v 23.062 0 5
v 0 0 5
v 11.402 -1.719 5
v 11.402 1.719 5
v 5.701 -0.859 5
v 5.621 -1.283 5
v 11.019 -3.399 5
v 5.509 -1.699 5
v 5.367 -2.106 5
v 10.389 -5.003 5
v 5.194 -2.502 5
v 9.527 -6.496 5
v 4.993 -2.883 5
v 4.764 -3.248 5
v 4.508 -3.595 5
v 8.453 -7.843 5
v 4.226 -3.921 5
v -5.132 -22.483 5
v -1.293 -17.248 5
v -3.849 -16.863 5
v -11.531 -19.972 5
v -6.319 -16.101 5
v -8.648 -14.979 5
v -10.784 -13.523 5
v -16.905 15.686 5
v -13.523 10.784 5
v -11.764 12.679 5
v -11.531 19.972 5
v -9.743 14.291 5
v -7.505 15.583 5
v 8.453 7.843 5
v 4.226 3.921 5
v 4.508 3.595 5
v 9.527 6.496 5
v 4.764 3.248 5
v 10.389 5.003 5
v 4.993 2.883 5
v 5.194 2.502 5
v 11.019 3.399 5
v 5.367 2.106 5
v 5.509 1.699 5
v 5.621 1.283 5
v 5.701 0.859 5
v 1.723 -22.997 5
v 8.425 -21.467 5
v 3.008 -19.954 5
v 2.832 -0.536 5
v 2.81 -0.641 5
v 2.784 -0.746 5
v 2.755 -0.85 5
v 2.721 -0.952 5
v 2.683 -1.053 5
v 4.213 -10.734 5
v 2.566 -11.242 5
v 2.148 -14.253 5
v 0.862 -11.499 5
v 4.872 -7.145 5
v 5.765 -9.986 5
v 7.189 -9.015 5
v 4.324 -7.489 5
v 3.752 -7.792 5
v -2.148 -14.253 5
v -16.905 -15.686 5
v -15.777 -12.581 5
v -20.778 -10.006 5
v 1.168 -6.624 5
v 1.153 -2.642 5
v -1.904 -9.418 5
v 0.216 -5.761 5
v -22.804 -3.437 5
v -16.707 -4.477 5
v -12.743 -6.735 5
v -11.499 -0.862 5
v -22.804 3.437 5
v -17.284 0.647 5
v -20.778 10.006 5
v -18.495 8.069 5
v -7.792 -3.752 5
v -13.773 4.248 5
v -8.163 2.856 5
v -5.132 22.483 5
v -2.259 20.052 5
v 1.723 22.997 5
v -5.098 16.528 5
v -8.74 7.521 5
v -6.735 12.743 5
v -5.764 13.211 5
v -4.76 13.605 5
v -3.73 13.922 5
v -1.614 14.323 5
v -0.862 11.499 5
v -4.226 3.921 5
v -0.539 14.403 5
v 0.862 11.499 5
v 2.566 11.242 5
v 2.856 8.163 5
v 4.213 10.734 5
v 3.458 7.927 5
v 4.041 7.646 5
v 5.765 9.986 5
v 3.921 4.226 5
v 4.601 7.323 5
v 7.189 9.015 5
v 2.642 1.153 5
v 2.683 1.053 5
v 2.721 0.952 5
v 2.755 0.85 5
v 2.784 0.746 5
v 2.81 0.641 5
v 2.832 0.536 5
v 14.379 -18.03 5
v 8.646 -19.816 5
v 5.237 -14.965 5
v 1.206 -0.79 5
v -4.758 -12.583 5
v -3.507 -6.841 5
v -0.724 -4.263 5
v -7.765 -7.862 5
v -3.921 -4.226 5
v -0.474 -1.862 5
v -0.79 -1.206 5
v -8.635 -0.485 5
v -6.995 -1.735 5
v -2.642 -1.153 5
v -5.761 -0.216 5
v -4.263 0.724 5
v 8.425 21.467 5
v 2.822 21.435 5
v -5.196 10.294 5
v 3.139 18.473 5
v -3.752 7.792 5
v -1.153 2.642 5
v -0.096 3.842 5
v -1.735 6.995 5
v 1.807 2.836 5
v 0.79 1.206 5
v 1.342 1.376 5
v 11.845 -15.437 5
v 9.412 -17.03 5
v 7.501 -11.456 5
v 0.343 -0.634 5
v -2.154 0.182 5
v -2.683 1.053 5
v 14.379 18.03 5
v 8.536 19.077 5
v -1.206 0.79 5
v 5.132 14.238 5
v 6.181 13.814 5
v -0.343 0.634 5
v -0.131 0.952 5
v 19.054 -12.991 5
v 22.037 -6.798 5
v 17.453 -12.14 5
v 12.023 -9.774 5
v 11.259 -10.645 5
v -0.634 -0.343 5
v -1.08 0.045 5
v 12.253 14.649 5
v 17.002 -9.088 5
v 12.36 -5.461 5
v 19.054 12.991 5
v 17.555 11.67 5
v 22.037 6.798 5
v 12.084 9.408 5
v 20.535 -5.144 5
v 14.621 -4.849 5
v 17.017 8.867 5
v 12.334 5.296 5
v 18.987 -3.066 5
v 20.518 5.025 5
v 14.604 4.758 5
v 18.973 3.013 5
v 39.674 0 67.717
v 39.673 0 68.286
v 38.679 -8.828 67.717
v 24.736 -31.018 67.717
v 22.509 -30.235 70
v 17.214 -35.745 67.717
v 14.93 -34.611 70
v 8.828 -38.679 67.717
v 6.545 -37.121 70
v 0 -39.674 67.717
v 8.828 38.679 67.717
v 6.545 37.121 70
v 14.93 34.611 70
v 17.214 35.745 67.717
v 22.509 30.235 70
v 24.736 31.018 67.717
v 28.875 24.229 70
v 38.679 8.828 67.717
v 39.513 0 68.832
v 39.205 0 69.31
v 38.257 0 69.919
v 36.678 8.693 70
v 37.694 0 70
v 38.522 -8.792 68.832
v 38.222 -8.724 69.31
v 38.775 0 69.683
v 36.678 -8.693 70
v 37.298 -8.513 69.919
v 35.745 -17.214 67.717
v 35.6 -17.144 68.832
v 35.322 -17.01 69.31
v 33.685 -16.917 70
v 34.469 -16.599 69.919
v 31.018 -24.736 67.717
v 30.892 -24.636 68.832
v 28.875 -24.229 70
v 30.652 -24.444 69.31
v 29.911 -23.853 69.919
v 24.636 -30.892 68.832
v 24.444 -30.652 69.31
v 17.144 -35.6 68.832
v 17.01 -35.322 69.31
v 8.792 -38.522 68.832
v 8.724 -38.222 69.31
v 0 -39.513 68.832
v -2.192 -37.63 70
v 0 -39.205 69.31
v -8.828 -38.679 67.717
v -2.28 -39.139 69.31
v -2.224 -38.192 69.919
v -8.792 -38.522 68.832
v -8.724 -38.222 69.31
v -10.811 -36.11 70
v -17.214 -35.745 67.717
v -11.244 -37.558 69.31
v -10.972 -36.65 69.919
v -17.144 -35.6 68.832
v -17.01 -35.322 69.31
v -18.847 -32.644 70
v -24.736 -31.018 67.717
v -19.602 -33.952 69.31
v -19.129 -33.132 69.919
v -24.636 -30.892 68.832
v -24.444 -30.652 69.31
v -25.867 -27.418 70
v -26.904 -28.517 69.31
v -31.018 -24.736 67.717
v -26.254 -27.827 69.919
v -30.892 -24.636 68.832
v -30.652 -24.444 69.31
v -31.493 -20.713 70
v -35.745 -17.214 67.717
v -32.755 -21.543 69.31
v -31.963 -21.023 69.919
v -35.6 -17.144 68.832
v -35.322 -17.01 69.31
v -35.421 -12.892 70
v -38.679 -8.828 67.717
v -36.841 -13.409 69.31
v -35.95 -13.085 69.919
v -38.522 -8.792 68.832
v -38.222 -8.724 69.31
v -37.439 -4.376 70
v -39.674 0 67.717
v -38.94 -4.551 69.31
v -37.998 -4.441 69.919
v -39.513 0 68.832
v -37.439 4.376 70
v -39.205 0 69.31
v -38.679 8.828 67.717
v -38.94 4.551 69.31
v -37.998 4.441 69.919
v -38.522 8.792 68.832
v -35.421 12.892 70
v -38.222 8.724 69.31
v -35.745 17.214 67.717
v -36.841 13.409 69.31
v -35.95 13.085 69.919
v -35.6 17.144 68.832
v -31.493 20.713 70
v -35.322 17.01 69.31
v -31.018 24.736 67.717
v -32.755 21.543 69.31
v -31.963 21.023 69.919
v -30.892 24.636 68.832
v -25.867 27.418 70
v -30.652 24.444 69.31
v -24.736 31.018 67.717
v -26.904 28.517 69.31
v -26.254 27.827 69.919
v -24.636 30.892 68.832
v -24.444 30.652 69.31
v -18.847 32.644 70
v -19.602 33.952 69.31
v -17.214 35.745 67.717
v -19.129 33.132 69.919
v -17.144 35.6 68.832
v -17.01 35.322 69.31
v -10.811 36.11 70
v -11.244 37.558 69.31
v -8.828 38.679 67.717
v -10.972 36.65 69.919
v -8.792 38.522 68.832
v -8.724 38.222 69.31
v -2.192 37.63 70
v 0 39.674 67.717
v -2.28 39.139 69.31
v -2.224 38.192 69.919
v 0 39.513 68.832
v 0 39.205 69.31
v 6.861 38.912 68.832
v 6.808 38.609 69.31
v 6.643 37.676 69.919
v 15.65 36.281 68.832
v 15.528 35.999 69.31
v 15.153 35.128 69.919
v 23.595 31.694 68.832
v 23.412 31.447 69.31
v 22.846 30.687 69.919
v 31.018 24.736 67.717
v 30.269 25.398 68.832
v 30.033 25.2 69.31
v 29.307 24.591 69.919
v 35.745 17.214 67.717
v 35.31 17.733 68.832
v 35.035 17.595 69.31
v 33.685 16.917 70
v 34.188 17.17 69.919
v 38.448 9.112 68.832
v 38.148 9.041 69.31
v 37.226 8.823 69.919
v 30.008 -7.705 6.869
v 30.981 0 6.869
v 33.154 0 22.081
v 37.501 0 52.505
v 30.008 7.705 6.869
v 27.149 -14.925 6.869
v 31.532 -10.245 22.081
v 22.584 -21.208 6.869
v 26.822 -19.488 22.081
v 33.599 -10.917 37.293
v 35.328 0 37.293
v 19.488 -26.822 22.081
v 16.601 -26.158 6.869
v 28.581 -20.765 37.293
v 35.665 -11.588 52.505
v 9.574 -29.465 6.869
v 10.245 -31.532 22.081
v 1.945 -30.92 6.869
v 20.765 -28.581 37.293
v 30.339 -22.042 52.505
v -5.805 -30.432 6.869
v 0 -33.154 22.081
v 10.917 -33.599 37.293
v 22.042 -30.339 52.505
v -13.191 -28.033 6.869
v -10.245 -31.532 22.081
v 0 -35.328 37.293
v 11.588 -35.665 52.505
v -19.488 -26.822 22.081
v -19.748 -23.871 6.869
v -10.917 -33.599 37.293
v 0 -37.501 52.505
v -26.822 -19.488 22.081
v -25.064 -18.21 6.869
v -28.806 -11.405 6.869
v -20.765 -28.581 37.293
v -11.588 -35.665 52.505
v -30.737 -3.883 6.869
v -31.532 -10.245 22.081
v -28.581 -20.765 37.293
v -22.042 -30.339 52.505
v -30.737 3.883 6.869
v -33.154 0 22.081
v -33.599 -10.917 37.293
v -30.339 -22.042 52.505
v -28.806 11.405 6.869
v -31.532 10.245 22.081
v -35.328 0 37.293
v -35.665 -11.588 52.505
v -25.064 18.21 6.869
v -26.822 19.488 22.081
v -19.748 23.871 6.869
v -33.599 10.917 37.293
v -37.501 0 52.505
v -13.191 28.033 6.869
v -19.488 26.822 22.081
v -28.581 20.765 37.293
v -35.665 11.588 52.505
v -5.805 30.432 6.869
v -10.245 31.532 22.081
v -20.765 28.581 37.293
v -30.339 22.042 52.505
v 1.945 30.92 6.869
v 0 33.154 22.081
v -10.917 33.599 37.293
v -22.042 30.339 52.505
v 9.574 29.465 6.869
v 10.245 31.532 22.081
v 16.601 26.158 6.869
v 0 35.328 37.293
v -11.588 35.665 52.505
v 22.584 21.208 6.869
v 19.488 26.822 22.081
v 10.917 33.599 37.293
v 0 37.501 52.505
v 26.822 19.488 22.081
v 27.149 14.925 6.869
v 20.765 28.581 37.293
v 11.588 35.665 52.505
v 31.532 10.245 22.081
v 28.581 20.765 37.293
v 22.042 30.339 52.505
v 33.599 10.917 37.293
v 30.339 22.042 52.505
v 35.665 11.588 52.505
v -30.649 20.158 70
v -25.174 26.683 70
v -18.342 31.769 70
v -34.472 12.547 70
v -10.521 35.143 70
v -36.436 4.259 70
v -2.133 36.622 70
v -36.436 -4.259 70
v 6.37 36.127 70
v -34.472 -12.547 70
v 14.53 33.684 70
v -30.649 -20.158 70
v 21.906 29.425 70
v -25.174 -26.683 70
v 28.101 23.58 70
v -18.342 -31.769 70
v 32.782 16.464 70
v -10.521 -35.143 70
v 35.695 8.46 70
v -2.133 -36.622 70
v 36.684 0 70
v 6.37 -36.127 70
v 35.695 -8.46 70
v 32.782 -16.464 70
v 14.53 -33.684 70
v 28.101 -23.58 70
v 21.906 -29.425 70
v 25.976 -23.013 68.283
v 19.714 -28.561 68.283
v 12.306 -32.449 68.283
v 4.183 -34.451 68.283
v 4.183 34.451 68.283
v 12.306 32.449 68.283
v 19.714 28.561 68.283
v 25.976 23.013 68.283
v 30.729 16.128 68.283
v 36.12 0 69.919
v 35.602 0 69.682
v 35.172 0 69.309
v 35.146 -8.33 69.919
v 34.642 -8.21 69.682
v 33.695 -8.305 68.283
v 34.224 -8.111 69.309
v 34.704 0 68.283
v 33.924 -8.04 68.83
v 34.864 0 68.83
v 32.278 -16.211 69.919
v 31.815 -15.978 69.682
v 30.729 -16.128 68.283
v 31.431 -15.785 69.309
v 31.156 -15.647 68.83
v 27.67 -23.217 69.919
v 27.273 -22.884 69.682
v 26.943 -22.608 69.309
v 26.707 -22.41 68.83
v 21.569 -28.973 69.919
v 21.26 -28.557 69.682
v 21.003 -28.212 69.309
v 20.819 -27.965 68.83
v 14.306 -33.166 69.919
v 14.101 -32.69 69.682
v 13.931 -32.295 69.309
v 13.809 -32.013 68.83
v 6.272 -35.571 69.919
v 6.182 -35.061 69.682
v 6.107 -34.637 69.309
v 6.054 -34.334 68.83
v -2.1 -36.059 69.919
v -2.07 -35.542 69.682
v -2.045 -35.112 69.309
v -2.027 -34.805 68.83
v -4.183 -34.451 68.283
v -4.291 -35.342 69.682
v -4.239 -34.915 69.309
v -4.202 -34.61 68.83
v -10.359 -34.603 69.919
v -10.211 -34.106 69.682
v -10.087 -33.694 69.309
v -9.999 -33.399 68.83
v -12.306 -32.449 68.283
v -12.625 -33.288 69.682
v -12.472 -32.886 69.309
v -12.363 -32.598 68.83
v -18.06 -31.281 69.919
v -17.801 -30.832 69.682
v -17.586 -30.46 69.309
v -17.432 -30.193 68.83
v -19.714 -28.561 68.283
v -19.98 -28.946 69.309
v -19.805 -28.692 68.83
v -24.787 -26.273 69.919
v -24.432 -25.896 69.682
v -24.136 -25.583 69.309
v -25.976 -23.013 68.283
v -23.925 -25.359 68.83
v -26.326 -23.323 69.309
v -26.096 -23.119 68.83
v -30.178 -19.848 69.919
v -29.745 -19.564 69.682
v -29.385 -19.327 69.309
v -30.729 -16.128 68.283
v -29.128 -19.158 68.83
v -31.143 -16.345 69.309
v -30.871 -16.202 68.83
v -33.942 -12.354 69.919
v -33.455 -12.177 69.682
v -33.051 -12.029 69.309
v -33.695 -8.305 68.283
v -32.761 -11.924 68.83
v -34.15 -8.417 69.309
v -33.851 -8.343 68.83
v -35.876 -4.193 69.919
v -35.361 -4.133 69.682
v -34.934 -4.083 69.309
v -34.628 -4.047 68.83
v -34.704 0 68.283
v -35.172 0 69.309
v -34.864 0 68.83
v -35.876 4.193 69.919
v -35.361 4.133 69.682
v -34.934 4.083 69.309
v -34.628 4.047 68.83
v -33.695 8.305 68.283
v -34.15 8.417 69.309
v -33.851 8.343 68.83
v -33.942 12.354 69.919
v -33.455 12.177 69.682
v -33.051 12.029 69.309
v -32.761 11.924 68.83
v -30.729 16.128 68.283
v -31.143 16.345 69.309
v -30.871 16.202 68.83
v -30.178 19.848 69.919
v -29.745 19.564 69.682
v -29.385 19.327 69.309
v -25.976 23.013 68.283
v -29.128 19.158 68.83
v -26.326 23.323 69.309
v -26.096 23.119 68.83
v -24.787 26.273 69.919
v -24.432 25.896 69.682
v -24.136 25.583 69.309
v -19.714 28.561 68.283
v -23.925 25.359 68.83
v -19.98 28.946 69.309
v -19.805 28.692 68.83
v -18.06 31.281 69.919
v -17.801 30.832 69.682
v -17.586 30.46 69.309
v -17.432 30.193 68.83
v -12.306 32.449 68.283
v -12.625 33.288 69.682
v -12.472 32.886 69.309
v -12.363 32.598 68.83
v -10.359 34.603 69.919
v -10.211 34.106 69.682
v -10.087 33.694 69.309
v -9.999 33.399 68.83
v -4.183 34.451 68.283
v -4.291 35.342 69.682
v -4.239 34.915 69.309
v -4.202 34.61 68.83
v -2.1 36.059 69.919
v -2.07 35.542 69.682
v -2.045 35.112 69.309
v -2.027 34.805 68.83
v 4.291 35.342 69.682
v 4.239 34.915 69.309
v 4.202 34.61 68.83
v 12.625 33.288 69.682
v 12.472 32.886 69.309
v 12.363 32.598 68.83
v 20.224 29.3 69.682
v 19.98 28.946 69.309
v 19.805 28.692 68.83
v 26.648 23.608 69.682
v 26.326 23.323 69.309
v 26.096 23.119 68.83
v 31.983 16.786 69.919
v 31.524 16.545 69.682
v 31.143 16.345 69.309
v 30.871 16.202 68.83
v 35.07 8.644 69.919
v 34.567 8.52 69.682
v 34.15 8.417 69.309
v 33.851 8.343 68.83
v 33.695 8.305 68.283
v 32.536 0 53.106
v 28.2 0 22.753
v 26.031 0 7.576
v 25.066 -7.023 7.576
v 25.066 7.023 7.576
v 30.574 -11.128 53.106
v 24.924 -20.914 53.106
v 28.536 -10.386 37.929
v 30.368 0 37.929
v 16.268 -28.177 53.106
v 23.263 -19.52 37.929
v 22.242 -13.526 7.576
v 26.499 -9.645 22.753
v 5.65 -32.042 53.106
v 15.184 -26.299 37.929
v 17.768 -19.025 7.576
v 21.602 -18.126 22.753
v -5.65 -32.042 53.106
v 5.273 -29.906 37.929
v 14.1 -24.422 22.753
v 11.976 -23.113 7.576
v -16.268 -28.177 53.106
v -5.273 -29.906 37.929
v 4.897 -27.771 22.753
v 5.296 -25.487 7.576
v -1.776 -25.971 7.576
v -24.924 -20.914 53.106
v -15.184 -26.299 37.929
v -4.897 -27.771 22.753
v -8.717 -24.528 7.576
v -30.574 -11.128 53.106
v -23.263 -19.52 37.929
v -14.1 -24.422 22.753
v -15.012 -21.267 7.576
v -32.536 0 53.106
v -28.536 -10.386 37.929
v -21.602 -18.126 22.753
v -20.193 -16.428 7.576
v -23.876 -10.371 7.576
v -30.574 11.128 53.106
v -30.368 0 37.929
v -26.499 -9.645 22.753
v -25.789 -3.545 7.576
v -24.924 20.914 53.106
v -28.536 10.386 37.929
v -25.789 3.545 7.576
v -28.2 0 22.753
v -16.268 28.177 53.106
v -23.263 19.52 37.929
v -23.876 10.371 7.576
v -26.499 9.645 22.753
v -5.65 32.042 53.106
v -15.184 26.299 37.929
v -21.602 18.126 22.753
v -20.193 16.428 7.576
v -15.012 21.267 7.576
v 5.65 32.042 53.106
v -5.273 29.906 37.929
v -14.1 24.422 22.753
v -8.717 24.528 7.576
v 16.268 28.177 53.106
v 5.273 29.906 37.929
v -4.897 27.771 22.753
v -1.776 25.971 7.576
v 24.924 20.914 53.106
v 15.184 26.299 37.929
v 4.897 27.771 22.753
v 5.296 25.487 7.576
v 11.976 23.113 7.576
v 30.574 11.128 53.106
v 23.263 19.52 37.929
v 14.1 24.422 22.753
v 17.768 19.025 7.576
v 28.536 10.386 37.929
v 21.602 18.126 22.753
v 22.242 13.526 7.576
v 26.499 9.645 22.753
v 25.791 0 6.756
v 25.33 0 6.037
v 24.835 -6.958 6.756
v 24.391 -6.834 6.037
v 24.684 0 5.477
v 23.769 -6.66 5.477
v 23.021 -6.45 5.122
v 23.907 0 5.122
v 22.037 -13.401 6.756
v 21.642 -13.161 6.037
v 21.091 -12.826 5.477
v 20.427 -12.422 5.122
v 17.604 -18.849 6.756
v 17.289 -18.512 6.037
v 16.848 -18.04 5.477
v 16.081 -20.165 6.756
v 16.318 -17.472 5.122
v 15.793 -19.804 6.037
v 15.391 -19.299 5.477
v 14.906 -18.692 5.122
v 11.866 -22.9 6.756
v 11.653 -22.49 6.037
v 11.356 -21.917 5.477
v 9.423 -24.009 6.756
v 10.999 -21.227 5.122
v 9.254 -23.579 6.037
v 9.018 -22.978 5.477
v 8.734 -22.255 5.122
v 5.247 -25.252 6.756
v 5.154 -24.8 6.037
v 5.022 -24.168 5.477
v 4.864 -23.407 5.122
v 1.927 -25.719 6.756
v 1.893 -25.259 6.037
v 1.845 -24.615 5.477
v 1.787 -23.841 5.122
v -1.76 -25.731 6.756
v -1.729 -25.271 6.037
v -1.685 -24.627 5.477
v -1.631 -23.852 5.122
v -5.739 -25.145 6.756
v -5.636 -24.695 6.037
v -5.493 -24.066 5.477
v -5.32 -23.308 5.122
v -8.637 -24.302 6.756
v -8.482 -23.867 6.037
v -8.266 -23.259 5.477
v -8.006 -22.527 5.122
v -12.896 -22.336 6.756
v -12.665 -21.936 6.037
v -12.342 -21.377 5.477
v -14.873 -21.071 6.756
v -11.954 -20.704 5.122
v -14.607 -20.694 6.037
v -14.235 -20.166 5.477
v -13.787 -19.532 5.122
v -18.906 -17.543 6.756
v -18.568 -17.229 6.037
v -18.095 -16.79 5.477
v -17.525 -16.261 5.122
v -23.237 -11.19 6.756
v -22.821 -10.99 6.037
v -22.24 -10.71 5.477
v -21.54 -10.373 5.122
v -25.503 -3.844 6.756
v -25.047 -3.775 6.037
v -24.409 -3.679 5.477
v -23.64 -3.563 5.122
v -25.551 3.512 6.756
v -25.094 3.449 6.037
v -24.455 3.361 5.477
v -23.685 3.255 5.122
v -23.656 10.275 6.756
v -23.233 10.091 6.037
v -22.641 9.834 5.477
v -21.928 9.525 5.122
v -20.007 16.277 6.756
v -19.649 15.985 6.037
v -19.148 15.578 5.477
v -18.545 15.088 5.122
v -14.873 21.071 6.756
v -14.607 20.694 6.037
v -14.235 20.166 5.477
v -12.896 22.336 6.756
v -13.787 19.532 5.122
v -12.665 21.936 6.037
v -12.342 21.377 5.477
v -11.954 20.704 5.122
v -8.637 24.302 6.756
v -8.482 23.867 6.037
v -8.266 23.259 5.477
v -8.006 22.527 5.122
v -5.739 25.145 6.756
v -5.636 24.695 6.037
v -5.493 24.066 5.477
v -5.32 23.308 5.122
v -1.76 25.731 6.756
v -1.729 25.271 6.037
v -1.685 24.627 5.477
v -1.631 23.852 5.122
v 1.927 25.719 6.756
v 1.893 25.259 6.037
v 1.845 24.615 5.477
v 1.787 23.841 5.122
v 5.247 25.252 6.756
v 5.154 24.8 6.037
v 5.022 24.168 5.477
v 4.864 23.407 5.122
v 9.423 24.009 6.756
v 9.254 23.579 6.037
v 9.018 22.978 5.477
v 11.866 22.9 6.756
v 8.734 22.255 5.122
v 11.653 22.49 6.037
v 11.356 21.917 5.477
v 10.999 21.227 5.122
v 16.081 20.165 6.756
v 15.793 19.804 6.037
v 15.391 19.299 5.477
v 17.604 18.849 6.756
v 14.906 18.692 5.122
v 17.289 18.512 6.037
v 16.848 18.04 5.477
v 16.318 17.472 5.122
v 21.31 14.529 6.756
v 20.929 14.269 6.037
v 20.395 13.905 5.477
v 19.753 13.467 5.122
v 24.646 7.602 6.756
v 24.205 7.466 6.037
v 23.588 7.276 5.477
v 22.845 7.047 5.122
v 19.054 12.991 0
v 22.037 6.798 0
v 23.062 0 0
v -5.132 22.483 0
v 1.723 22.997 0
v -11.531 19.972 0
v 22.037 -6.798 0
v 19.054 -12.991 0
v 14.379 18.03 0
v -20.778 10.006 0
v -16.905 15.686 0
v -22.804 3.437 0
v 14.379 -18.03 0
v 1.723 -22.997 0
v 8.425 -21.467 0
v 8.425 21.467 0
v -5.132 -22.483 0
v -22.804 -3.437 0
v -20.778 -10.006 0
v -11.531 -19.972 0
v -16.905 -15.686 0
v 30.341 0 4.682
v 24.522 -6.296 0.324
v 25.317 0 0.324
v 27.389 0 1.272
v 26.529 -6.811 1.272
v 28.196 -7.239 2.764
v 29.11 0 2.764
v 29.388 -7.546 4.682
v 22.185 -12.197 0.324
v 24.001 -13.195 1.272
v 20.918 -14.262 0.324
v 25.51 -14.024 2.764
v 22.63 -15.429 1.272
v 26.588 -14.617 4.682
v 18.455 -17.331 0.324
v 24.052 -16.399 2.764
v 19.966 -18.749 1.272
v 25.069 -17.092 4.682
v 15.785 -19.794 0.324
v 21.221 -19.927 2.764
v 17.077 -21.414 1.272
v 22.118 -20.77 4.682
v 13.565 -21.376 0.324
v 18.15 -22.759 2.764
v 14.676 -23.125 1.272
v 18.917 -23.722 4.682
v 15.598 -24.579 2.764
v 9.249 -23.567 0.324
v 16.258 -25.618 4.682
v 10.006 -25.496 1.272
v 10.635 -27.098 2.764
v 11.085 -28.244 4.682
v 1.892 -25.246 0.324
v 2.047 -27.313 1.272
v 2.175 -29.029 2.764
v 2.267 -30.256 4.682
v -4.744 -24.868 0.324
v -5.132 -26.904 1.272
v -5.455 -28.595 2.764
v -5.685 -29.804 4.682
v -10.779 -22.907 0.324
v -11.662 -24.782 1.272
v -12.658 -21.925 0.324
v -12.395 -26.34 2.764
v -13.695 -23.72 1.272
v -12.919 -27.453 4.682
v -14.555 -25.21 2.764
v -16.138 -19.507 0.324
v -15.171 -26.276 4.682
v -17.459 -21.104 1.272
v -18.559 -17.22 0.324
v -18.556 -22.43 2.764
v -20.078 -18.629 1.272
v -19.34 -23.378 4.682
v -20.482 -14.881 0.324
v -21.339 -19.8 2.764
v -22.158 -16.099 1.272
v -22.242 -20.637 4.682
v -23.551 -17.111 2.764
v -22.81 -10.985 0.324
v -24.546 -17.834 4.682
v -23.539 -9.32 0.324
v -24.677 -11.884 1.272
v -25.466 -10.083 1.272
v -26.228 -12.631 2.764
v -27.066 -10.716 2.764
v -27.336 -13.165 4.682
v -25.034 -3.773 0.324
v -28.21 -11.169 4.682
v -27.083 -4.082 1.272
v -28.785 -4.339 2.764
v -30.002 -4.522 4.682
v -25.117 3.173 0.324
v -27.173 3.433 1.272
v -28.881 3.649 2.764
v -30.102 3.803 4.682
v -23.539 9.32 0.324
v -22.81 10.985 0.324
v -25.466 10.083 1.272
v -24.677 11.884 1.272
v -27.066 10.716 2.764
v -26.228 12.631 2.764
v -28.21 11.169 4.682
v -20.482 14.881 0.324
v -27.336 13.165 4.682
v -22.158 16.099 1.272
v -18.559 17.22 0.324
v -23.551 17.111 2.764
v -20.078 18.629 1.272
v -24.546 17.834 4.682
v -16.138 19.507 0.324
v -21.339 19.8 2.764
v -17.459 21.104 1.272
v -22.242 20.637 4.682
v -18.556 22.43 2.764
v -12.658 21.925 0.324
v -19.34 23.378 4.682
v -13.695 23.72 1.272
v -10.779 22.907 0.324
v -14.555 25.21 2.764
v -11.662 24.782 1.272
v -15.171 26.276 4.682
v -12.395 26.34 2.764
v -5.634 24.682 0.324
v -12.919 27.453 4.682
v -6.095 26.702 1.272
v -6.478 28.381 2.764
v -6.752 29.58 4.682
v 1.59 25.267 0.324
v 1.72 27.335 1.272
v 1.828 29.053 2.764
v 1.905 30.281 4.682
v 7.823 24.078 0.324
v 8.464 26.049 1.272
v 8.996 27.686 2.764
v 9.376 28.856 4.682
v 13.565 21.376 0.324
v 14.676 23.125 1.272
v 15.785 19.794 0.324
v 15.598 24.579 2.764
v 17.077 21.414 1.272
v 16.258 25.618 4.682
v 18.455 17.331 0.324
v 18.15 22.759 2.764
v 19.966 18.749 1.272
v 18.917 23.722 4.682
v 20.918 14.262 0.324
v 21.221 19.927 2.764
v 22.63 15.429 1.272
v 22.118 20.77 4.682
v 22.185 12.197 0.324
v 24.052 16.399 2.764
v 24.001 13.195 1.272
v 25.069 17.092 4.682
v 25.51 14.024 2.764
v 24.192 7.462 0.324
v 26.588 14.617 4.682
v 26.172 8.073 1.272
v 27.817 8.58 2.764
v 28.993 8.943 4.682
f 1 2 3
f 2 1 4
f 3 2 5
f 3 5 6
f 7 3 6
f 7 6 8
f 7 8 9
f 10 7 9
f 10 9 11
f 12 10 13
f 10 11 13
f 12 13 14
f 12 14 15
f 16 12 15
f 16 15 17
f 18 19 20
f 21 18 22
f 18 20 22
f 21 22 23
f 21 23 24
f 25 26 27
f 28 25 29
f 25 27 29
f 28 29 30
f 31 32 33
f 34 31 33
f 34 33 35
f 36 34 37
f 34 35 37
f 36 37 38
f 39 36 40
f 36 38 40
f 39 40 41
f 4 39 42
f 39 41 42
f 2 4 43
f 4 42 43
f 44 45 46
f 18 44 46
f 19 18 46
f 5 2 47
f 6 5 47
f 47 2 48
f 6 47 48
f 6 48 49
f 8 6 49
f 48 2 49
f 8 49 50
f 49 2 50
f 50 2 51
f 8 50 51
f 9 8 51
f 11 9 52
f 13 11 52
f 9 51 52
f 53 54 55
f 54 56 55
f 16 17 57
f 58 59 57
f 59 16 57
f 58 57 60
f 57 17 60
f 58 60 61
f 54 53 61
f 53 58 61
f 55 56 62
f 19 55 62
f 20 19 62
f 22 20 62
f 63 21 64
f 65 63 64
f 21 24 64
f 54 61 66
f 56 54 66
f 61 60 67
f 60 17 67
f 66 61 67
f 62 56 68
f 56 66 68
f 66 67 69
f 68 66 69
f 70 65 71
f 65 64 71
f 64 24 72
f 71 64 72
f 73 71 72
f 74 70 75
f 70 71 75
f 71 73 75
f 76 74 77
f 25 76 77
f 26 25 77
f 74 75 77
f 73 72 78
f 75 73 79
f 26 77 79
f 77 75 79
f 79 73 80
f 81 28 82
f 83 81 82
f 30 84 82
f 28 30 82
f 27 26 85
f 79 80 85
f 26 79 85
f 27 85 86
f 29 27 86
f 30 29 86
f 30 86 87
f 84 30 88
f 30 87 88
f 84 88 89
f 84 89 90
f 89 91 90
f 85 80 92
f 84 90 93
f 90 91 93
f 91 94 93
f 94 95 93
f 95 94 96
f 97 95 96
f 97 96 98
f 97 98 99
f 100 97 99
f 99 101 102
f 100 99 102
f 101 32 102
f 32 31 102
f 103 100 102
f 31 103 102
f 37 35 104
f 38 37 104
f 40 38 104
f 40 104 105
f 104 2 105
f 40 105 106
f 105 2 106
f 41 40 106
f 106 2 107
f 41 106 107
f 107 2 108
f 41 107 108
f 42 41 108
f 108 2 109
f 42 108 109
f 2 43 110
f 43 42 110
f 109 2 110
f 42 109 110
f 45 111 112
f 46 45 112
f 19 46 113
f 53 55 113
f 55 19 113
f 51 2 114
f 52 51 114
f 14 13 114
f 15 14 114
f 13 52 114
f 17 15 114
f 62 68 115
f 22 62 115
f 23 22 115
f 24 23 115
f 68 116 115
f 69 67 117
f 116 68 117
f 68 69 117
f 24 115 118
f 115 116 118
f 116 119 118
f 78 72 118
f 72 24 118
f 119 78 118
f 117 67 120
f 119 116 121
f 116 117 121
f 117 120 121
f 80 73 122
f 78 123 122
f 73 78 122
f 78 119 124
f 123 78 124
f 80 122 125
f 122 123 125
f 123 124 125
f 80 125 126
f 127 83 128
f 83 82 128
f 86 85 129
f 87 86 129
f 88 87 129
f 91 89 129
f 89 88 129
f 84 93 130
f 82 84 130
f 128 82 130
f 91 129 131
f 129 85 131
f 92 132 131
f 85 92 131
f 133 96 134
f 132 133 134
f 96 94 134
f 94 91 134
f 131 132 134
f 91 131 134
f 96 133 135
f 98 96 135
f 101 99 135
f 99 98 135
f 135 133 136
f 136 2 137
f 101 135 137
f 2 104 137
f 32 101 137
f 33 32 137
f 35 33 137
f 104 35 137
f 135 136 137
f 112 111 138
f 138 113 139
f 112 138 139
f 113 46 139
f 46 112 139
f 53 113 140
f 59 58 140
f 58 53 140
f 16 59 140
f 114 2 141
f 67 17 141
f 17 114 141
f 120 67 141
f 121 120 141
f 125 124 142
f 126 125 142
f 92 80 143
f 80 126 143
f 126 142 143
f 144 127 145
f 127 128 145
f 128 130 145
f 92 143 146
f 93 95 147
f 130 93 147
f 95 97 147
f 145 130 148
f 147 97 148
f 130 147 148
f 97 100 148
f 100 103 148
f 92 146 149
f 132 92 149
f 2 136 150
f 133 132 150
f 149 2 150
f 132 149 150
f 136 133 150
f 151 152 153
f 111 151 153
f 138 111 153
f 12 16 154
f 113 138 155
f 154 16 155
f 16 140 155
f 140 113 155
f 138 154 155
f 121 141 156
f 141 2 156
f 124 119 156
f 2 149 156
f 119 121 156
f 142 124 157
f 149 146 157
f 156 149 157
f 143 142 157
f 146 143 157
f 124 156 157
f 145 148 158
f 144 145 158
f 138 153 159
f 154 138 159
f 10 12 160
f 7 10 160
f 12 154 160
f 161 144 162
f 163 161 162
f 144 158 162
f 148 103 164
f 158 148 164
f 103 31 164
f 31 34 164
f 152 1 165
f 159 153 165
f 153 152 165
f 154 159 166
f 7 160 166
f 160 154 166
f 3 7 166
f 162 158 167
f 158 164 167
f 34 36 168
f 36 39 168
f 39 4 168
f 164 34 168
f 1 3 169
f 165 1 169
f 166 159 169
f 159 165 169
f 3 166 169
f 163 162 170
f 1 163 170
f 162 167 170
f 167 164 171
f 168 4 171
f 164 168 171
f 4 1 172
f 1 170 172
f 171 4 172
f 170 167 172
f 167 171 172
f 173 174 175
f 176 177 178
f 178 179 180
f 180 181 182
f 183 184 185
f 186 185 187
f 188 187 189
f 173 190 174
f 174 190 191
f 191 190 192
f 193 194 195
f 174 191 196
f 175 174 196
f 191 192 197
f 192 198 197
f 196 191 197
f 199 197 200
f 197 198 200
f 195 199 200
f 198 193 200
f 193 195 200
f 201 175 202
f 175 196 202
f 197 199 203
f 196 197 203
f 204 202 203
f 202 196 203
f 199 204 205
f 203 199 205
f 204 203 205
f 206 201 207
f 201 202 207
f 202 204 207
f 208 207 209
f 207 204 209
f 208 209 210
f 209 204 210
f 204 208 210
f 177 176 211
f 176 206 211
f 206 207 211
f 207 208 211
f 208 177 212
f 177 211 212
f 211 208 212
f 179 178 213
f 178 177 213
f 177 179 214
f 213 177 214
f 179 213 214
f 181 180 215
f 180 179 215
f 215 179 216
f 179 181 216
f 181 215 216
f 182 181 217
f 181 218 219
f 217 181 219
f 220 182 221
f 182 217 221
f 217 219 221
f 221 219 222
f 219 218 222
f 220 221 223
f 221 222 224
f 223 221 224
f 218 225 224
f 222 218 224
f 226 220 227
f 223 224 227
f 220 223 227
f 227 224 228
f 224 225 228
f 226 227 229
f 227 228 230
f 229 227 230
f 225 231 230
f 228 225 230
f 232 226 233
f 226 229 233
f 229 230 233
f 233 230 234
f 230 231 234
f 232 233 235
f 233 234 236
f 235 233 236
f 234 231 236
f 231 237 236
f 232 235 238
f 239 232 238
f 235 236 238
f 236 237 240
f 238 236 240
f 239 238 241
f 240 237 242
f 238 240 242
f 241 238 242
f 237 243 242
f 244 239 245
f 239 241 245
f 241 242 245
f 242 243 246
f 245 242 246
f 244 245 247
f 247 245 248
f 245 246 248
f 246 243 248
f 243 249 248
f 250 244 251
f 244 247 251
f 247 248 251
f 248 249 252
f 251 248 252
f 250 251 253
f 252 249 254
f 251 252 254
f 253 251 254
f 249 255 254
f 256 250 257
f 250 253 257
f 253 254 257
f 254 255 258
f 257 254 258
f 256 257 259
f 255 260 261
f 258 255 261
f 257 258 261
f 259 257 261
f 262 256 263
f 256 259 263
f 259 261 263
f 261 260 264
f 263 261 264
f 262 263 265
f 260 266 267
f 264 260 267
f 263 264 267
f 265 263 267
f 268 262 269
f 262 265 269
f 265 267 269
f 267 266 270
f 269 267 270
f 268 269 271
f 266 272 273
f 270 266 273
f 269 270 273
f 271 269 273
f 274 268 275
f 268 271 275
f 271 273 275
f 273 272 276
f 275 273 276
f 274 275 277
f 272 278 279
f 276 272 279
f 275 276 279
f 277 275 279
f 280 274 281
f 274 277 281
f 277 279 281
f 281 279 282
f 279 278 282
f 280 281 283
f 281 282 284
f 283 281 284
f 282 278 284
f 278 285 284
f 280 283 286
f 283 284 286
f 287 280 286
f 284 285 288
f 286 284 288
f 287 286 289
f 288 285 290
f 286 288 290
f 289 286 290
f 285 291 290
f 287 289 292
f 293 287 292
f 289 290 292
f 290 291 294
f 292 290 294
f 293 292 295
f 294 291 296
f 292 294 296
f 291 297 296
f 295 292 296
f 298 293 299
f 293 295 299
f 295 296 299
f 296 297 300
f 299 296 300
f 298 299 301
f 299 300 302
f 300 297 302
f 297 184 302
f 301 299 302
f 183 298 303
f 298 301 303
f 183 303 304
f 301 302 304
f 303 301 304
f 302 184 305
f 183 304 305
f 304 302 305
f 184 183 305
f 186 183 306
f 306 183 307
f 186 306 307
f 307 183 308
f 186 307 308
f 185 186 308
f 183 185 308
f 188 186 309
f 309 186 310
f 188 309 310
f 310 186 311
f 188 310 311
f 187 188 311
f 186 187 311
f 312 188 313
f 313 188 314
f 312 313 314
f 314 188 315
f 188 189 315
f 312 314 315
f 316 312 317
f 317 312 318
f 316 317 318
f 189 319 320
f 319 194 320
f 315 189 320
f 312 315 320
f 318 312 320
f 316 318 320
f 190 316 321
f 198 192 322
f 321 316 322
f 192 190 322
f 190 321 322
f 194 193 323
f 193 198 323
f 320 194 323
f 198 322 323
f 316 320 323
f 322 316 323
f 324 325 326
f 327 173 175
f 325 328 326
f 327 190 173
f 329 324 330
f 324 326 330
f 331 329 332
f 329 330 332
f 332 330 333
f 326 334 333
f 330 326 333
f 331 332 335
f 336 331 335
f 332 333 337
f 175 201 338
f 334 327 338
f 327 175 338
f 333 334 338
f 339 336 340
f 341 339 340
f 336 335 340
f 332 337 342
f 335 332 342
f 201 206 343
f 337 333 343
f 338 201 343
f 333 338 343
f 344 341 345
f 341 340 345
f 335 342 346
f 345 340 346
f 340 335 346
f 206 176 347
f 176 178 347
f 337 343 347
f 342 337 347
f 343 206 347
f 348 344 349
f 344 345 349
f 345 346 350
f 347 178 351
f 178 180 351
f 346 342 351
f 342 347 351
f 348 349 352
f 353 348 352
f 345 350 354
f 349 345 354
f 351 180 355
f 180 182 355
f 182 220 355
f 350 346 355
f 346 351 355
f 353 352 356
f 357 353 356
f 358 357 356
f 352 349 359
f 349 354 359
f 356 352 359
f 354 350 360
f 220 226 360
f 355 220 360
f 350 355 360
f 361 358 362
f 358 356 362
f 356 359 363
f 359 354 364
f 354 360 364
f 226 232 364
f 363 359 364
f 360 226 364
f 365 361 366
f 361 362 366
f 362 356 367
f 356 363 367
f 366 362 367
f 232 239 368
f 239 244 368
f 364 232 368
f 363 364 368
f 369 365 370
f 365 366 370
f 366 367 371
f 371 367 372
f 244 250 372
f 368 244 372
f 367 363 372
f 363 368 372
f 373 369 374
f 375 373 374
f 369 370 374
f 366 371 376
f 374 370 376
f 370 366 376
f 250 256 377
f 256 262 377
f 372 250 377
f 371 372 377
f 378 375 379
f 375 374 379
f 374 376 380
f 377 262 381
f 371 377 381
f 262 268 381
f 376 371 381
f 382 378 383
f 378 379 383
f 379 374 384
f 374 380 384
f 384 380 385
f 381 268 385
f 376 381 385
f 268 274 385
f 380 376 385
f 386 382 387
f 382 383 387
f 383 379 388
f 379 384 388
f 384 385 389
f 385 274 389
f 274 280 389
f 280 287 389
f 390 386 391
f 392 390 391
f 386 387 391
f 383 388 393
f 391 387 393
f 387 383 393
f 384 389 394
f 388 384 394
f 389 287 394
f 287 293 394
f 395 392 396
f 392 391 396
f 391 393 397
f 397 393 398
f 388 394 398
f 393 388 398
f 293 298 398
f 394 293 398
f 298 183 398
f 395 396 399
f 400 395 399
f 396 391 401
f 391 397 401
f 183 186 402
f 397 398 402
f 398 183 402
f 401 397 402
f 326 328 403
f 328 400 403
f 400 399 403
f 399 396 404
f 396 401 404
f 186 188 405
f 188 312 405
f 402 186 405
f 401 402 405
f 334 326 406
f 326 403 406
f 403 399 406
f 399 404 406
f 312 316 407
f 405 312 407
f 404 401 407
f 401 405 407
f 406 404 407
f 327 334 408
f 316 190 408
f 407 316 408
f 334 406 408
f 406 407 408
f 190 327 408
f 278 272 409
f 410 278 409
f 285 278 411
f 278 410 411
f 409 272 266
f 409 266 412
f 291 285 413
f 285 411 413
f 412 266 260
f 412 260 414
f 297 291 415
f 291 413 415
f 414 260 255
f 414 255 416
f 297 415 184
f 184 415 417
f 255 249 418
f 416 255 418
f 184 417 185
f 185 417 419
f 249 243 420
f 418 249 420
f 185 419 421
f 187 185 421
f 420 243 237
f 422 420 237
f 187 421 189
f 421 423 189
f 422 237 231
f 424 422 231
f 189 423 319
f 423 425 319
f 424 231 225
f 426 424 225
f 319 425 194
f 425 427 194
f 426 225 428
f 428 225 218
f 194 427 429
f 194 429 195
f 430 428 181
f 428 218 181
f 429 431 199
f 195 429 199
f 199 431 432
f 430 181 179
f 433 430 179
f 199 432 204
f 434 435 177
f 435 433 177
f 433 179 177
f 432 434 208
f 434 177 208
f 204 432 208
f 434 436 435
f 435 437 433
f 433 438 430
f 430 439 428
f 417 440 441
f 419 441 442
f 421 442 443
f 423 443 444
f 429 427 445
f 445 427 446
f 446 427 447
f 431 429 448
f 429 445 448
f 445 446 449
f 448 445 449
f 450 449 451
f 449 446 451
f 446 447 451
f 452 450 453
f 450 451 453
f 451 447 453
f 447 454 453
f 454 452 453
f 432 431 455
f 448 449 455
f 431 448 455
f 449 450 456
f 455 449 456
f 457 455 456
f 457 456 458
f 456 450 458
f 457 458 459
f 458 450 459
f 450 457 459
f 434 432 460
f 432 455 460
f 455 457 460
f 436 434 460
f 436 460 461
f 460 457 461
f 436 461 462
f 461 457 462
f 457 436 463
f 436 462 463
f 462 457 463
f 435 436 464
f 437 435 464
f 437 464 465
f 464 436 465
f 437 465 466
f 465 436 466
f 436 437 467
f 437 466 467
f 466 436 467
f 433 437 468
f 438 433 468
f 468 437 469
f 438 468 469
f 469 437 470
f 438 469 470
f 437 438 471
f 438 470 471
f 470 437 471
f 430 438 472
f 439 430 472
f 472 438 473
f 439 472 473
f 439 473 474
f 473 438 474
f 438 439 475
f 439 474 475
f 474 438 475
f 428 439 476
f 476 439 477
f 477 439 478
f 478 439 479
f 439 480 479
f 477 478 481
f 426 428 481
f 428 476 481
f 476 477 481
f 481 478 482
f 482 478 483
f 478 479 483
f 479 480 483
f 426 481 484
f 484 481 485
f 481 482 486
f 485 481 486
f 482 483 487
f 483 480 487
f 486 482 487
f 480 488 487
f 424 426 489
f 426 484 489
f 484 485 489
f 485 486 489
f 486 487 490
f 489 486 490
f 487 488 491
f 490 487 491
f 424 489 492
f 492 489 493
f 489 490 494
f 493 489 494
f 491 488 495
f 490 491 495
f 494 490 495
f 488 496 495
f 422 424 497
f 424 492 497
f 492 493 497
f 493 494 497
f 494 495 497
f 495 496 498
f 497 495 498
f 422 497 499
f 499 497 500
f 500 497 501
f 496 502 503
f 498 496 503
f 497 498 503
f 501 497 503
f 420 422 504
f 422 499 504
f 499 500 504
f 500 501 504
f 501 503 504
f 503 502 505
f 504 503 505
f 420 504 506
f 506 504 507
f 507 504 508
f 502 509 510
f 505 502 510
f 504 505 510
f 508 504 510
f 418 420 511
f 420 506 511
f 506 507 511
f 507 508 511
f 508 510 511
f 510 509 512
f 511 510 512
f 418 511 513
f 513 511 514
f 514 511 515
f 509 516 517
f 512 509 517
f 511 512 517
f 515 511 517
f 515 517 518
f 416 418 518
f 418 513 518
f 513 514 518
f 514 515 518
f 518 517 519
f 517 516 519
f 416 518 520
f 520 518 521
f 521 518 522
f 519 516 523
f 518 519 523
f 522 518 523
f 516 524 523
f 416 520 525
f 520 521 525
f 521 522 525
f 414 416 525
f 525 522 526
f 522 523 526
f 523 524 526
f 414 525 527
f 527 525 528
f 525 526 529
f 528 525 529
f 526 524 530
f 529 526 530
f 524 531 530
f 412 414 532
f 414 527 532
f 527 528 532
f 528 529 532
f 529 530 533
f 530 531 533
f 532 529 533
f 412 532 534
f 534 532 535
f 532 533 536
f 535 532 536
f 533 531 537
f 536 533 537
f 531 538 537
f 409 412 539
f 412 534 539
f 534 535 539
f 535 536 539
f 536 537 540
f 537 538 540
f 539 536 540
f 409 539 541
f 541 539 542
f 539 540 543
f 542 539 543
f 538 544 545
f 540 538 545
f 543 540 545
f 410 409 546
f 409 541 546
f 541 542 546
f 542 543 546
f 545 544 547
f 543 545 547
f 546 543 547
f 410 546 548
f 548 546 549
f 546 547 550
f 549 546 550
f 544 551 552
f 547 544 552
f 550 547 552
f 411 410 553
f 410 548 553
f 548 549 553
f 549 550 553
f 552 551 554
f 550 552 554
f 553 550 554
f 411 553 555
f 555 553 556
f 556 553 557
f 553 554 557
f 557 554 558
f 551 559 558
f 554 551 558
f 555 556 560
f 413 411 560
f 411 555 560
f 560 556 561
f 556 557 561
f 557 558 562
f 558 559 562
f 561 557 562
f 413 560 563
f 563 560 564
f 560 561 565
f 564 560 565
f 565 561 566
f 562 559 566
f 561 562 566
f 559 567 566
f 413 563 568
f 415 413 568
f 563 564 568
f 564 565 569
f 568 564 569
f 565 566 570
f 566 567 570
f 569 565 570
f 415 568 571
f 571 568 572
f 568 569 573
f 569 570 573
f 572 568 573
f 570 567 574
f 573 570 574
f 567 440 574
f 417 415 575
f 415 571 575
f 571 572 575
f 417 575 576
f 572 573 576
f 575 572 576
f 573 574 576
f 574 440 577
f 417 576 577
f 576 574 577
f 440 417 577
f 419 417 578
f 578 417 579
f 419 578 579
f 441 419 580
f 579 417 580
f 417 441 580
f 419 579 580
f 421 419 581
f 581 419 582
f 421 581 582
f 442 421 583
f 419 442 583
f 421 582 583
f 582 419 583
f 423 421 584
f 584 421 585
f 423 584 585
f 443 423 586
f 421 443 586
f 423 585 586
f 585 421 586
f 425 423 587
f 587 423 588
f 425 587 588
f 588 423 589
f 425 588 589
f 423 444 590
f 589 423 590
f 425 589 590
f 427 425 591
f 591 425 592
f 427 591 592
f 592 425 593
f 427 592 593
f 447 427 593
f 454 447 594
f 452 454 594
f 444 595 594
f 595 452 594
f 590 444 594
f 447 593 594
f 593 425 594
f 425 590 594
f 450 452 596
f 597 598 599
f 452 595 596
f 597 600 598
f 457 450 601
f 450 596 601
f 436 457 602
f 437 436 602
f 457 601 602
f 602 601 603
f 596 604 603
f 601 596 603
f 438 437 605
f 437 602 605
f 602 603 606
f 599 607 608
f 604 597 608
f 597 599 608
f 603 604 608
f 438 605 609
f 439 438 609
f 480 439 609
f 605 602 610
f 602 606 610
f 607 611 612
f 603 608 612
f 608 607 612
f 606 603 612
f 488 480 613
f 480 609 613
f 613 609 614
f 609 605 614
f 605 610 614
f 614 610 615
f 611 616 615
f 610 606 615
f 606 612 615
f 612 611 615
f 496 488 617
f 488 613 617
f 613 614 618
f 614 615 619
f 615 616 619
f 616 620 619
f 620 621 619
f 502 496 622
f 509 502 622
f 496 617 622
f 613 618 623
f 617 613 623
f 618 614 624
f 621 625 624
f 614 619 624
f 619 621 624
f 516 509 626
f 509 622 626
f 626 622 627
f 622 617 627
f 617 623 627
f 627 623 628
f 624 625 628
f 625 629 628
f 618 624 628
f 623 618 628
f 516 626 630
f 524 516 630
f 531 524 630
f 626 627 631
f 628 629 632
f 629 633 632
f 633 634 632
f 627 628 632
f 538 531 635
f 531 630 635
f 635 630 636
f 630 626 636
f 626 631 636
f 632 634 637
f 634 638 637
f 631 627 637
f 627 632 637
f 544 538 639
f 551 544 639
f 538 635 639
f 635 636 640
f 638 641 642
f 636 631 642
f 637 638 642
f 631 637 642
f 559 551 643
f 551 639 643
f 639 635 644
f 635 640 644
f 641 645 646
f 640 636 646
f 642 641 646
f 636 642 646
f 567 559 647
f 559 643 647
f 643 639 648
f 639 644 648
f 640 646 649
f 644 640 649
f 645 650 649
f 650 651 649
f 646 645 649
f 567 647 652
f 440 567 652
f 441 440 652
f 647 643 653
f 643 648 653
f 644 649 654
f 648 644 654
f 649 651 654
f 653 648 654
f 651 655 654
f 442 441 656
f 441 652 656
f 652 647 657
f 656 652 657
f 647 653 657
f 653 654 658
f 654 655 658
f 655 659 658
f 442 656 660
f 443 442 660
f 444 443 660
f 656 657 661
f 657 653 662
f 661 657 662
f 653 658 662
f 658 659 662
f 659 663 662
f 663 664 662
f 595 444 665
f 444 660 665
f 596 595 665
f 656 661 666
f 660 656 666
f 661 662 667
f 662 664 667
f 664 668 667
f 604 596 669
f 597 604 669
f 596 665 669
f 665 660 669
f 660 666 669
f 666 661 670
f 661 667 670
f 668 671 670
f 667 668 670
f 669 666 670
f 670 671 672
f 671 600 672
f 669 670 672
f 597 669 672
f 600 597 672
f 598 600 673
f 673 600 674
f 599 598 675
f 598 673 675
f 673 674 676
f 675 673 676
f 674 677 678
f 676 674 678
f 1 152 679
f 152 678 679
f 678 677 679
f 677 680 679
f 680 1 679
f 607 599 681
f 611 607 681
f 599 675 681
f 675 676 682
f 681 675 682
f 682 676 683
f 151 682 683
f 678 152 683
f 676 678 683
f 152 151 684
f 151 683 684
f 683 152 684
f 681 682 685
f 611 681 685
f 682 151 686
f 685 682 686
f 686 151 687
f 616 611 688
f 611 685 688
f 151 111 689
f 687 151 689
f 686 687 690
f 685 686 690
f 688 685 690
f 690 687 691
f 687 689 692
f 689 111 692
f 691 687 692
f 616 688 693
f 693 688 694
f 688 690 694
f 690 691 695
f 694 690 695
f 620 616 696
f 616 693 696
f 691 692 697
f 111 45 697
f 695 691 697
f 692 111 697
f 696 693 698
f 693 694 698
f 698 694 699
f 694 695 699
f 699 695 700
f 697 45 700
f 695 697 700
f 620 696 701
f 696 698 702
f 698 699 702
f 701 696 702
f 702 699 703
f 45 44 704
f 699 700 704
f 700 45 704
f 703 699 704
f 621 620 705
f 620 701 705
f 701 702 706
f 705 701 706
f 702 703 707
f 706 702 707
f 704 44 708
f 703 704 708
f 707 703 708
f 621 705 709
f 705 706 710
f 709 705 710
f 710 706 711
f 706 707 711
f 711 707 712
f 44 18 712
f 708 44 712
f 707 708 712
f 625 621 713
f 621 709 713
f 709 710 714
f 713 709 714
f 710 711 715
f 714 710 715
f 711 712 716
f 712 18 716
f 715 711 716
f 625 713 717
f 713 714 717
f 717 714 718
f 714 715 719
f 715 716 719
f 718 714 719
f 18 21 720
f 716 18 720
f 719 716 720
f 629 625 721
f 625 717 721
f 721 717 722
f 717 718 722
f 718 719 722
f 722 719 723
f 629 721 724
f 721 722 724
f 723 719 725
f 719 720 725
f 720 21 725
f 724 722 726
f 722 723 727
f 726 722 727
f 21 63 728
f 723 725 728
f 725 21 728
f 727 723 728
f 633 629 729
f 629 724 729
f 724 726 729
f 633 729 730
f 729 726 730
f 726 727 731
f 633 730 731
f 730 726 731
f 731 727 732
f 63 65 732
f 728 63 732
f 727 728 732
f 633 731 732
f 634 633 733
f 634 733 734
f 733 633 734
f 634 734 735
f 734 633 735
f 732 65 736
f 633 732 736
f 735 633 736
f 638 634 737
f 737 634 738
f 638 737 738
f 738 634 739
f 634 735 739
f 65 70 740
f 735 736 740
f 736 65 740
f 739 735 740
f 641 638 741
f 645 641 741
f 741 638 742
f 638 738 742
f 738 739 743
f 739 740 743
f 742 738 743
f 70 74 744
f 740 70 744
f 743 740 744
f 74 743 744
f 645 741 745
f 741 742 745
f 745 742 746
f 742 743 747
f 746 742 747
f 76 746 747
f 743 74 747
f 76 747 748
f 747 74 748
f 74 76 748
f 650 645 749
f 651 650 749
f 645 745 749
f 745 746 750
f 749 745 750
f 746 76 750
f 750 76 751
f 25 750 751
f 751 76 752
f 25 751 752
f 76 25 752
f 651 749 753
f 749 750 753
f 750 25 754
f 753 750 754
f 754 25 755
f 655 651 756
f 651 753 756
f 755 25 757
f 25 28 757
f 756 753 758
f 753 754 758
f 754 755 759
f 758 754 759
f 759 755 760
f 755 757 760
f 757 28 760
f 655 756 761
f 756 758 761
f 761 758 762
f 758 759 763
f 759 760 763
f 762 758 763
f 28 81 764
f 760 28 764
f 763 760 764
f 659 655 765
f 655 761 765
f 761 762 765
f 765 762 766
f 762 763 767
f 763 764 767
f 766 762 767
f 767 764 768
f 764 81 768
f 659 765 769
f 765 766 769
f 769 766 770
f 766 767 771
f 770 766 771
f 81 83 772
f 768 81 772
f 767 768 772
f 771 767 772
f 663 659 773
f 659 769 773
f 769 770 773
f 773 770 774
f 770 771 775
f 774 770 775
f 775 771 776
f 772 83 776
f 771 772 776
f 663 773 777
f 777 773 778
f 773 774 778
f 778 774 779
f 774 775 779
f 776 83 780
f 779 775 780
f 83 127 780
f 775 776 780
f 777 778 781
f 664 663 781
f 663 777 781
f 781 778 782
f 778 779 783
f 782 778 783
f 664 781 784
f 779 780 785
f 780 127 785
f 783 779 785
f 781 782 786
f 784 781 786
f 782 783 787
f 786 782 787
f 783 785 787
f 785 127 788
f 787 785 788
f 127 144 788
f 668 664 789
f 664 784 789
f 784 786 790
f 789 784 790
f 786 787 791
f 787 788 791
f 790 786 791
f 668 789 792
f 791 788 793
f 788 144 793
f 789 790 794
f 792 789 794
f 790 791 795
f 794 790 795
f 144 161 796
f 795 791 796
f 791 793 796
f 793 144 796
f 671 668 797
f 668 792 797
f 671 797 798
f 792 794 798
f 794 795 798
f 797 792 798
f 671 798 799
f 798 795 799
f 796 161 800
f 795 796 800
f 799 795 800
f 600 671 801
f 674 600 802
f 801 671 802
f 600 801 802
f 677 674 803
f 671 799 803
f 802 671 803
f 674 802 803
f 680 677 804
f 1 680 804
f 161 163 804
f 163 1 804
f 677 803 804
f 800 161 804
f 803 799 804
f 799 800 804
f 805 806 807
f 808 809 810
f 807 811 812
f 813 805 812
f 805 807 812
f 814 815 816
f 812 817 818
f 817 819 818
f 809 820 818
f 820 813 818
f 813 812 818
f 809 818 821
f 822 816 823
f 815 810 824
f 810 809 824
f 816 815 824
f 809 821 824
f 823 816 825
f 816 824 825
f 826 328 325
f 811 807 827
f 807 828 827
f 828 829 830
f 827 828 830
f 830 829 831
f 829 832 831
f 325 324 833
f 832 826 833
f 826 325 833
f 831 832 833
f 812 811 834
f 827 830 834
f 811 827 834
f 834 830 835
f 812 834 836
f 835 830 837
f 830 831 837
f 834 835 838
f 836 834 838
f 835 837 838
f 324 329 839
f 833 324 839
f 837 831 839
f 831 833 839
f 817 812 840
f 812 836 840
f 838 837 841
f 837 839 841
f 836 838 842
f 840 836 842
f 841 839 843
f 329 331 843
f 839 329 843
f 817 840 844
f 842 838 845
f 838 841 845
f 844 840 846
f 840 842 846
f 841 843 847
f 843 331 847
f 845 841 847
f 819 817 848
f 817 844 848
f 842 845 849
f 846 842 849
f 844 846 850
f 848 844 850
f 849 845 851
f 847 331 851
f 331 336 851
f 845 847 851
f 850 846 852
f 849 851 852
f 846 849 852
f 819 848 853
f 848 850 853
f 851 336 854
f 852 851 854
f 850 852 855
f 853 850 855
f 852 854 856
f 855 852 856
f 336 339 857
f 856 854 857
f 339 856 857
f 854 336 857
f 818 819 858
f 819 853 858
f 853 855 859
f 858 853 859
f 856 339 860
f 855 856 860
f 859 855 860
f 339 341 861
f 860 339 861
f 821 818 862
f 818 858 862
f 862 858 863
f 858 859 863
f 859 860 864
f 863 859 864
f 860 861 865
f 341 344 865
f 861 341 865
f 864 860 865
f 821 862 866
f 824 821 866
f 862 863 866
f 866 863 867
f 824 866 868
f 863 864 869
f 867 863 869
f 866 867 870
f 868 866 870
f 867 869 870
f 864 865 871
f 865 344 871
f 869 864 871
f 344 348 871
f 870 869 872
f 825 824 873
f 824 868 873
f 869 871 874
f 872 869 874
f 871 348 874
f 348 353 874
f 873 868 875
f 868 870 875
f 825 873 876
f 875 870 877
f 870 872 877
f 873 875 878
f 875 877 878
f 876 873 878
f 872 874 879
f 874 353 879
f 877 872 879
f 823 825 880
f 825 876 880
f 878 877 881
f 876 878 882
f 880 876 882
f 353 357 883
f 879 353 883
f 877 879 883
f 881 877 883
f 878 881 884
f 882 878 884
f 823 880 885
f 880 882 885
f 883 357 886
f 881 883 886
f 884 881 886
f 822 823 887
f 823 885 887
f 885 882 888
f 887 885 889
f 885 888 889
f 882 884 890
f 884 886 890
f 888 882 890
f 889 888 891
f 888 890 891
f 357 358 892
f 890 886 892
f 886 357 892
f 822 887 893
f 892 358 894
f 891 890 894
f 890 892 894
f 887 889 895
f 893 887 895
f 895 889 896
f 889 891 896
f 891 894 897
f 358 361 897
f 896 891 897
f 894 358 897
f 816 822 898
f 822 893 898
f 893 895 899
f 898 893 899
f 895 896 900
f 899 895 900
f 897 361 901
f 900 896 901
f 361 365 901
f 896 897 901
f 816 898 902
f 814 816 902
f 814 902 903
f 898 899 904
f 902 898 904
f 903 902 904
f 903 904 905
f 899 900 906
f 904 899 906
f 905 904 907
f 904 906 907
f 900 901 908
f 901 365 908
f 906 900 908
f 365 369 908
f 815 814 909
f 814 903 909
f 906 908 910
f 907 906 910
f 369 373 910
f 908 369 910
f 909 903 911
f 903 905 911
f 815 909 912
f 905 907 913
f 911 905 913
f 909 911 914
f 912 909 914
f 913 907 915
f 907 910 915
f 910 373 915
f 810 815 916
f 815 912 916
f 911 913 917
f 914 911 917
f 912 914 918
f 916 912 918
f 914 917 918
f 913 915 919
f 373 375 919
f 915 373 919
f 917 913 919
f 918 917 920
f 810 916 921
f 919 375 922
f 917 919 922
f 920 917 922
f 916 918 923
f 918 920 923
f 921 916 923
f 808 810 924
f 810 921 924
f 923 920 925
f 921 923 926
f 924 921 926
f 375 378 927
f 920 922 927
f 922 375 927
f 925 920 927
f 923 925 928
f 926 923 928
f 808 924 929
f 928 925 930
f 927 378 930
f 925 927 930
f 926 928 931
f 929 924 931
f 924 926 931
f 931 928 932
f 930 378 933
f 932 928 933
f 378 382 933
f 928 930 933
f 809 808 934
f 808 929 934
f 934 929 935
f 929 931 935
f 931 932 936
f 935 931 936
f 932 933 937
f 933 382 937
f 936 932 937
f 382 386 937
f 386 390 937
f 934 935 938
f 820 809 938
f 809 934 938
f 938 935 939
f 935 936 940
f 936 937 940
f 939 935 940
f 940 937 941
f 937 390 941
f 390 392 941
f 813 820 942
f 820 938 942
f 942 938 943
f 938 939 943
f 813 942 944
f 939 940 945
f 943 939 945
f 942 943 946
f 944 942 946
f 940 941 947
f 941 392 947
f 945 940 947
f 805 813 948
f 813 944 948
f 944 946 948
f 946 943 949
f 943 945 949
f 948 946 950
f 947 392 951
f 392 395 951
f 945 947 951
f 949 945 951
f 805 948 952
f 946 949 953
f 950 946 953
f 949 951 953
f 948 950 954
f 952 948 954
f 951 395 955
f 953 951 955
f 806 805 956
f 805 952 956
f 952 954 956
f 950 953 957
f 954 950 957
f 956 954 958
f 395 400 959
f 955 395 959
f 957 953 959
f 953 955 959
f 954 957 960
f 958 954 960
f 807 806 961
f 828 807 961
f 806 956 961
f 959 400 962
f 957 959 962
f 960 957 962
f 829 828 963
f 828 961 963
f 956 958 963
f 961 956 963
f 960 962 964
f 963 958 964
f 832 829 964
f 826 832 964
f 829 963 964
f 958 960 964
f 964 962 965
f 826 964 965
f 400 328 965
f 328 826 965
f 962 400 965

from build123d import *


# Not quite as in the source:
# - ends of sketch curves that miss each other by under 0.0002 mm in the source are joined


with BuildPart() as f1:
    # F0 (on Front) → F1 (revolve)
    with BuildSketch(Plane.XZ):
        with BuildLine():
            Line((0, 4.9999998882), (0, 0))
            Line((0, 0), (23.0616367864, 0))
            ThreePointArc((23.0616367864, 0), (28.3032507173, 1.95636836), (30.9812327357, 6.8686291501))
            Line((30.9812327357, 6.8686291501), (39.6738796125, 67.7171572875))
            ThreePointArc((39.6738796125, 67.7171572875), (39.2048885352, 69.3104034827), (37.6939806252, 70))
            Line((37.6939806252, 70), (36.6838267834, 70))
            ThreePointArc((36.6838267834, 70), (35.3734233007, 69.51090791), (34.7039277961, 68.2828427125))
            Line((34.7039277961, 68.2828427125), (26.0314839961, 7.5757361129))
            ThreePointArc((26.0314839961, 7.5757361129), (25.0272421924, 5.7336379253), (23.0616367864, 4.9999997224))
            Line((23.0616367864, 4.9999997224), (0, 4.9999998882))
        make_face()
    revolve(axis=Axis((0, 0, 2.4999999441), (0, 0, -1)))


solid = f1.part
